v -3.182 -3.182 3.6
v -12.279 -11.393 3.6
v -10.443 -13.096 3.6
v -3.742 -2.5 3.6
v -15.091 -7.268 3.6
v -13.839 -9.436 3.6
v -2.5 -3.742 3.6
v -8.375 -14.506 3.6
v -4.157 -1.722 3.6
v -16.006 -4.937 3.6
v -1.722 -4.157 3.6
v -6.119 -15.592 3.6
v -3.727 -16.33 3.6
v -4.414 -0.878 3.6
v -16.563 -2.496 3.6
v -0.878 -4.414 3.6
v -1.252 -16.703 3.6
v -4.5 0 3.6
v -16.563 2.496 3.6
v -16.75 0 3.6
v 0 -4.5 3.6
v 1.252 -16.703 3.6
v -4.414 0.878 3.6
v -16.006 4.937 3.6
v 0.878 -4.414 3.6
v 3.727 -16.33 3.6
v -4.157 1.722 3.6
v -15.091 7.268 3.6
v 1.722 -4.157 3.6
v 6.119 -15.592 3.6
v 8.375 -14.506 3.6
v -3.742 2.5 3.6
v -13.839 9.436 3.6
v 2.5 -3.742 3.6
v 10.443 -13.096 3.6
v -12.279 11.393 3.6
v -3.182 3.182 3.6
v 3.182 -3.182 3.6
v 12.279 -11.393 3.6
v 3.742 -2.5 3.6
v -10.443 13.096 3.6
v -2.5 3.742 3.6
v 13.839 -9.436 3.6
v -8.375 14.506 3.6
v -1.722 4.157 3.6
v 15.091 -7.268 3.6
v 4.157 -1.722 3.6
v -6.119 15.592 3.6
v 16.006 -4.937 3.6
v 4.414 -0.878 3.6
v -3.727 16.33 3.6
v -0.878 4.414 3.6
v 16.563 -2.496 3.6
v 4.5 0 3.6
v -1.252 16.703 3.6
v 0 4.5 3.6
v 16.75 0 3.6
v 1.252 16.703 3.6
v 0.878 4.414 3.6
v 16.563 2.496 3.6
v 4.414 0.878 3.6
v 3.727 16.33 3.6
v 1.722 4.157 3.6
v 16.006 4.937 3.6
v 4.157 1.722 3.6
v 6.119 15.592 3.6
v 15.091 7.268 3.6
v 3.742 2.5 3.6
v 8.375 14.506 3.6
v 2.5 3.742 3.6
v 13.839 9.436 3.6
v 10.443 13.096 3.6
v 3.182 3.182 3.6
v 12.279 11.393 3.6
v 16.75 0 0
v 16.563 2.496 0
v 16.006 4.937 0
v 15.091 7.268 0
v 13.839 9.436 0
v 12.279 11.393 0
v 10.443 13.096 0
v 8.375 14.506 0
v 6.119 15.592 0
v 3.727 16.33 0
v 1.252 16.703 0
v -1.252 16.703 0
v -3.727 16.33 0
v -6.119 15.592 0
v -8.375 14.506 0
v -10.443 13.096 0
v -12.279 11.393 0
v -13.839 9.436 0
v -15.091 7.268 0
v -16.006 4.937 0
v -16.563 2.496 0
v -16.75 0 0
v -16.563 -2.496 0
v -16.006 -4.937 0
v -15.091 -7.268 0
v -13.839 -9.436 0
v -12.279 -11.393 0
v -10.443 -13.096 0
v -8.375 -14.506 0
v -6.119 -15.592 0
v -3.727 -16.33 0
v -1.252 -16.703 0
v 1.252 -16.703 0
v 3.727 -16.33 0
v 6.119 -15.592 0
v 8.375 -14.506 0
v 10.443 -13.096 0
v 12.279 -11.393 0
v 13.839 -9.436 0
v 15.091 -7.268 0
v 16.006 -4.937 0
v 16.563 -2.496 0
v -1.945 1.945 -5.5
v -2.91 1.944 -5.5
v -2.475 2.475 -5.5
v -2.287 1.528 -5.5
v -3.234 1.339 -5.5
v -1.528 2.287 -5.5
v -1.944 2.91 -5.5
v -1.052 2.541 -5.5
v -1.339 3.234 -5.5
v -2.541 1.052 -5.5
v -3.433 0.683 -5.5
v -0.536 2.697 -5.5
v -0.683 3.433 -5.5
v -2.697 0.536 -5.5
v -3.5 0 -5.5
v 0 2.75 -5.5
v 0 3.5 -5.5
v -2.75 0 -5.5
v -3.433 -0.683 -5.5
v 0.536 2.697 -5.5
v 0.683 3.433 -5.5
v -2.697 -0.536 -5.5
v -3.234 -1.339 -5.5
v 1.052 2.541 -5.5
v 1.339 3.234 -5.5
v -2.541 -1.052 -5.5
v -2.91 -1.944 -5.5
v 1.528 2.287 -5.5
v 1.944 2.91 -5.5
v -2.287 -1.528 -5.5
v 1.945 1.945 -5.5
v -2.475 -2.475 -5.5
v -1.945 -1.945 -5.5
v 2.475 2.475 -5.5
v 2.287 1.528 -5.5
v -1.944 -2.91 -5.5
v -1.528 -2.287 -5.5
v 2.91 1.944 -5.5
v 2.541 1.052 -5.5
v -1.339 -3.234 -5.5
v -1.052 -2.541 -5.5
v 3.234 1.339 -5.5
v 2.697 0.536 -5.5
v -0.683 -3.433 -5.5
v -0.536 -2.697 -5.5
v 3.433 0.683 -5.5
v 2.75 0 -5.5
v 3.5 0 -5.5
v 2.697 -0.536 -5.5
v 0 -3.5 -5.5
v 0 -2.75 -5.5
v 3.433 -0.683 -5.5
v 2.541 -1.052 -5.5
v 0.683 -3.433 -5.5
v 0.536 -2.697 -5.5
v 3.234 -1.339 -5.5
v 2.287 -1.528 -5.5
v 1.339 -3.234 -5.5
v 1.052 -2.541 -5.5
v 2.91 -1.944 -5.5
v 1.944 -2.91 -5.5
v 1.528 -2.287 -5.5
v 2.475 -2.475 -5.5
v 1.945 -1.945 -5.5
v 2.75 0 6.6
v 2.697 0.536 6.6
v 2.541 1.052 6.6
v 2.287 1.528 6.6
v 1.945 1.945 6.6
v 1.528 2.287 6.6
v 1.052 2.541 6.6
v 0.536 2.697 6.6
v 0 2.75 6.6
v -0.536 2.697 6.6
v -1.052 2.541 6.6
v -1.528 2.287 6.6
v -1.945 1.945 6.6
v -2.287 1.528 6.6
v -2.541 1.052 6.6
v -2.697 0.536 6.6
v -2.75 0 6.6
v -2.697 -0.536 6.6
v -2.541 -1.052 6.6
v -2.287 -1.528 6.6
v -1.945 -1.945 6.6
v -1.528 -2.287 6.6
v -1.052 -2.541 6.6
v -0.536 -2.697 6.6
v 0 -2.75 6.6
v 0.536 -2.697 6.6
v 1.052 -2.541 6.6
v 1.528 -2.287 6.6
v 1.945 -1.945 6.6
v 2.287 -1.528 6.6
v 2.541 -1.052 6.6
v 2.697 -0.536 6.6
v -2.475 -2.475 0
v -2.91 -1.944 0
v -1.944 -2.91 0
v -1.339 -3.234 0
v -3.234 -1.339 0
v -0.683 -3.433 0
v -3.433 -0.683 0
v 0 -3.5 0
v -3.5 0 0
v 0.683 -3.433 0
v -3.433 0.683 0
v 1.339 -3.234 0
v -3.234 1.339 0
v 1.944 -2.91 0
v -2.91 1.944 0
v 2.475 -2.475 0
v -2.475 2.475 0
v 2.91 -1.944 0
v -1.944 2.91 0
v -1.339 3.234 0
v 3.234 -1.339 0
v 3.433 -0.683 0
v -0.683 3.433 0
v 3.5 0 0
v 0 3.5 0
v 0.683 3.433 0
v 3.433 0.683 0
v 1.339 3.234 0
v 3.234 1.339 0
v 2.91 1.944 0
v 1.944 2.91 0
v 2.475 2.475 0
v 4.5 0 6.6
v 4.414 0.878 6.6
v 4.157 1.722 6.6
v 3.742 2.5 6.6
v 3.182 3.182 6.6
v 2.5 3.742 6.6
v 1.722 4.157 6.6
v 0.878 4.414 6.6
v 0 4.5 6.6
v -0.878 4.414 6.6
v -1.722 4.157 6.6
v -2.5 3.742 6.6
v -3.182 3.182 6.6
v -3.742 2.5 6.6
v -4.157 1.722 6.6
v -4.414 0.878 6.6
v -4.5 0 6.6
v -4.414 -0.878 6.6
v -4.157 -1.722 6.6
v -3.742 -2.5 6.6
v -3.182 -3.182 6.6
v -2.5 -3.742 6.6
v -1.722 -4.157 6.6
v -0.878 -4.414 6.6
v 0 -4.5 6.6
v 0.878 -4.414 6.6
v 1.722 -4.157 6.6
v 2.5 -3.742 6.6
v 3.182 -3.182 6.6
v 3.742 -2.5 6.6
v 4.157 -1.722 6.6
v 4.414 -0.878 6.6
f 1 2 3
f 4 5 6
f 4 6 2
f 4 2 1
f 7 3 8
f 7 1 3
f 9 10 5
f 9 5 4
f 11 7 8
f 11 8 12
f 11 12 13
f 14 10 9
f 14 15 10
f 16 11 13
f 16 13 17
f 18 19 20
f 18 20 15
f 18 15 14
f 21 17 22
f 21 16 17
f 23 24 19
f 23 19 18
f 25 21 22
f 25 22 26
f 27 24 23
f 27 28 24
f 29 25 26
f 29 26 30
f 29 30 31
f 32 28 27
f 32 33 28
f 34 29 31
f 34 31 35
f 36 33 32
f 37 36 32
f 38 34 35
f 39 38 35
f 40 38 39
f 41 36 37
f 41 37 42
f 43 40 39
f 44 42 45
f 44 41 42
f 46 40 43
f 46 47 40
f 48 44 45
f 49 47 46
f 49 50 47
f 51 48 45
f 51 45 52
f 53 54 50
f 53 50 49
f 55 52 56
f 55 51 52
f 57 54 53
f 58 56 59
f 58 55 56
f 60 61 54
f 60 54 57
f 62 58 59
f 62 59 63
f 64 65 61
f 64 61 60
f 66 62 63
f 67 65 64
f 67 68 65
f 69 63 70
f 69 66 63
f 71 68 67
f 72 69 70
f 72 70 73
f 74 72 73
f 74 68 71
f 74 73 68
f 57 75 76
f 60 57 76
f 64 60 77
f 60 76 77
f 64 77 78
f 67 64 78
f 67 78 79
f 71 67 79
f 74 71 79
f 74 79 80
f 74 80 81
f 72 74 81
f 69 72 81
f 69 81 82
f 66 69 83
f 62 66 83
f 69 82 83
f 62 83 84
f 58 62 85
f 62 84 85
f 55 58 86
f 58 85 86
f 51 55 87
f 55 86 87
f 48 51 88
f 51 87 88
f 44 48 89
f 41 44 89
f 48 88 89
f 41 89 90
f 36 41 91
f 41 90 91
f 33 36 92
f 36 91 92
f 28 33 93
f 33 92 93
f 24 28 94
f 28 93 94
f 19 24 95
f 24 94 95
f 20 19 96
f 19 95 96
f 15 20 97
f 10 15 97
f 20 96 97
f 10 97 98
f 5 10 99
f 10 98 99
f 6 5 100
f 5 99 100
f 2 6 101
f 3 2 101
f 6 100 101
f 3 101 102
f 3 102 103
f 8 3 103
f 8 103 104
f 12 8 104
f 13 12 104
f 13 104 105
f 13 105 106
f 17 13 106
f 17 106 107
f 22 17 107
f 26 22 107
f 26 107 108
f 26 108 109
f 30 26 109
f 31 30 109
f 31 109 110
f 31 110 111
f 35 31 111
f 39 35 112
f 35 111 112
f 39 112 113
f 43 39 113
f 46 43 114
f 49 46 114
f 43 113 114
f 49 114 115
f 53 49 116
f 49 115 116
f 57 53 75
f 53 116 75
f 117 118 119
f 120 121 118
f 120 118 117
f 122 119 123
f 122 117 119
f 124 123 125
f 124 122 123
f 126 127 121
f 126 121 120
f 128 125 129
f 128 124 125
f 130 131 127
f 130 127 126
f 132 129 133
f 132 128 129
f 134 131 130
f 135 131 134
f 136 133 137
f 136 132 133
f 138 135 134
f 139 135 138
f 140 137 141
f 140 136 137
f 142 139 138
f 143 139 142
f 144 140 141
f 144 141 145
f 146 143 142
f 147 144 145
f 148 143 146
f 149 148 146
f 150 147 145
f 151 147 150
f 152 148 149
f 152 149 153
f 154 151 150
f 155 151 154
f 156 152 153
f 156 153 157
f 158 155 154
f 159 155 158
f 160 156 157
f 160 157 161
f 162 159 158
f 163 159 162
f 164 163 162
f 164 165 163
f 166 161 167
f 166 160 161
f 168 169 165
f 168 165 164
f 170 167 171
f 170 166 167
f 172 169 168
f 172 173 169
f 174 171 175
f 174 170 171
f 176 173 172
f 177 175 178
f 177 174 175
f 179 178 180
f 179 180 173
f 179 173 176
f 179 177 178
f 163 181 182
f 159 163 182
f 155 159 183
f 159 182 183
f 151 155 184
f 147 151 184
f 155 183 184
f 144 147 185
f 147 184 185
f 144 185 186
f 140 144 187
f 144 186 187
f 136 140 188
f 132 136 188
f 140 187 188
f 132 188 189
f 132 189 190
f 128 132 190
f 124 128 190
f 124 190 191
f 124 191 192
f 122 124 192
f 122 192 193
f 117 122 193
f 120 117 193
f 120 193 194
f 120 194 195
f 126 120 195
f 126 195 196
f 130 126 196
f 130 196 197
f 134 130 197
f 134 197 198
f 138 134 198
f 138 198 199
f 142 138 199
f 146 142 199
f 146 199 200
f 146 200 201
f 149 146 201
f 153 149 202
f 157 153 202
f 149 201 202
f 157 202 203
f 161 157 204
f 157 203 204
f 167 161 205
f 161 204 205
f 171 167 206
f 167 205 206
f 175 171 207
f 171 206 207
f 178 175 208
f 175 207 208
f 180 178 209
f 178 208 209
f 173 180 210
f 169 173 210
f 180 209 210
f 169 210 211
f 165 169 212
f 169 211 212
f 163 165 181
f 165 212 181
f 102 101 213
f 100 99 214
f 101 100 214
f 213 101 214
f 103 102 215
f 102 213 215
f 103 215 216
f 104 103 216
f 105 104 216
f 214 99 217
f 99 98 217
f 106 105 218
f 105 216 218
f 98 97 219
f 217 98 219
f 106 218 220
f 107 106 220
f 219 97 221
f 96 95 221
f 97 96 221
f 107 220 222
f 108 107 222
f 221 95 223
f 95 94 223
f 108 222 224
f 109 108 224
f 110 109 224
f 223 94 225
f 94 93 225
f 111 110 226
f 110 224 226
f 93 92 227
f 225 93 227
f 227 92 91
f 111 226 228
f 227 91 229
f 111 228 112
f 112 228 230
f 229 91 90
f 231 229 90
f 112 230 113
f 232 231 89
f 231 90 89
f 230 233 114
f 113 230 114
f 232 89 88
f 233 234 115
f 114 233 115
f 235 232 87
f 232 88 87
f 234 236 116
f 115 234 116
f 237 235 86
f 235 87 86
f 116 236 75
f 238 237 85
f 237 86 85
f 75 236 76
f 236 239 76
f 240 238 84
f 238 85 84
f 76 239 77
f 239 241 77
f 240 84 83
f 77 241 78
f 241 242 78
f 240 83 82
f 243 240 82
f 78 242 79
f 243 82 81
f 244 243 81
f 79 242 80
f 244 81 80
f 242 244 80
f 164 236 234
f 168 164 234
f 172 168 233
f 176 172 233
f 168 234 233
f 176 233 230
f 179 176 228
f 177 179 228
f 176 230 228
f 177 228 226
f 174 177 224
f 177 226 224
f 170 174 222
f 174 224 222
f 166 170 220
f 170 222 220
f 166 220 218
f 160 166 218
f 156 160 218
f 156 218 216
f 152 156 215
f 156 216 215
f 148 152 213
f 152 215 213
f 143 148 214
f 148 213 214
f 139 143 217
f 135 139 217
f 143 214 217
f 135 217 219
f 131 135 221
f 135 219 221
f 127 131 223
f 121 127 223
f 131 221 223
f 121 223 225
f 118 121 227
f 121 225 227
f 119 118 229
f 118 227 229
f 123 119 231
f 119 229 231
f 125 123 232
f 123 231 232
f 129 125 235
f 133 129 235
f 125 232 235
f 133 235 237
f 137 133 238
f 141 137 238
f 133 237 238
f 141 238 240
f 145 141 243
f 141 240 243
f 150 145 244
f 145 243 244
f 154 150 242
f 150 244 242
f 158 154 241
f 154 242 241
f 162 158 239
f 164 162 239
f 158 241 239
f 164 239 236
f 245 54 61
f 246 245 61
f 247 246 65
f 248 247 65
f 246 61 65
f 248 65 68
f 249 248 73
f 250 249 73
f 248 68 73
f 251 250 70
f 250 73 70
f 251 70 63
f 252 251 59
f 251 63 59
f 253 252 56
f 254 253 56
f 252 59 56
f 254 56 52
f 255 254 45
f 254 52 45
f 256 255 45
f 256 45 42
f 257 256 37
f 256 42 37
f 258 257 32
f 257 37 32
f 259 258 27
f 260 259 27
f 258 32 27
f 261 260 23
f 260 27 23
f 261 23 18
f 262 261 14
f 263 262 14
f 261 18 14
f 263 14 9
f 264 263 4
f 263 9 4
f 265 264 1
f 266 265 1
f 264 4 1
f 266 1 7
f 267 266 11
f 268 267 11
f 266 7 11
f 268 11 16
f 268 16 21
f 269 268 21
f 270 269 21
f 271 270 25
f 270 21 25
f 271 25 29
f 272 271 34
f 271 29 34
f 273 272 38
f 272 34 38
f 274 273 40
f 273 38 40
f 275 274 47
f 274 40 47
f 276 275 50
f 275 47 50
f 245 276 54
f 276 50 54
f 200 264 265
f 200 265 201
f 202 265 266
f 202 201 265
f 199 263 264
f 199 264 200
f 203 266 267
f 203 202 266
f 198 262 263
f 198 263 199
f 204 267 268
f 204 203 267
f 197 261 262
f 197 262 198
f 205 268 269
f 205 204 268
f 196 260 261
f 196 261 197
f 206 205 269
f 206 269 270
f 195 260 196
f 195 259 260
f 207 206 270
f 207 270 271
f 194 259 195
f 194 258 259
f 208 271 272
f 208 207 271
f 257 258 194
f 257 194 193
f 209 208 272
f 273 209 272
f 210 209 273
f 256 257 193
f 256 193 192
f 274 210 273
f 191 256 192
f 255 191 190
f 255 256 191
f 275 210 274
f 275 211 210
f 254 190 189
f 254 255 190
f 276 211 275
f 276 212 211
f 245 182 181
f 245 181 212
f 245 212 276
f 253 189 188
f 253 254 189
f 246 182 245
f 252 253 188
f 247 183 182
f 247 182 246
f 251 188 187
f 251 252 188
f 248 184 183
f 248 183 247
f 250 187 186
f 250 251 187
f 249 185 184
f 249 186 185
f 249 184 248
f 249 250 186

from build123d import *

# Parameters (mm, degrees)
SKETCH_R     = 16.75
PAD_DEPTH    = 3.6
SKETCH003_R  = 3.5
PAD002_DEPTH = 5.5
SKETCH001_R  = 4.5
PAD001_DEPTH = 3
SKETCH002_R  = 2.75
POCKET_DEPTH = 12.101


with BuildPart() as part:
    # Sketch → Pad (new body)
    with BuildSketch(Plane.XY):
        Circle(SKETCH_R)
    extrude(amount=PAD_DEPTH)

    # Sketch003 (on Face2 of Pocket) → Pad002 (join)
    with BuildSketch(Plane(origin=(0, 0, 0), x_dir=(1, 0, 0), z_dir=(0, 0, -1))):
        Circle(SKETCH003_R)
    extrude(amount=PAD002_DEPTH)

    # Sketch001 (on Face3 of Pad) → Pad001 (join)
    with BuildSketch(Plane.XY.offset(3.6)):
        Circle(SKETCH001_R)
    extrude(amount=PAD001_DEPTH)

    # Sketch002 (on Face5 of Pad001) → Pocket (cut, through all)
    with BuildSketch(Plane.XY.offset(6.6)):
        Circle(SKETCH002_R)
    extrude(amount=-POCKET_DEPTH, mode=Mode.SUBTRACT)


solid = part.part
